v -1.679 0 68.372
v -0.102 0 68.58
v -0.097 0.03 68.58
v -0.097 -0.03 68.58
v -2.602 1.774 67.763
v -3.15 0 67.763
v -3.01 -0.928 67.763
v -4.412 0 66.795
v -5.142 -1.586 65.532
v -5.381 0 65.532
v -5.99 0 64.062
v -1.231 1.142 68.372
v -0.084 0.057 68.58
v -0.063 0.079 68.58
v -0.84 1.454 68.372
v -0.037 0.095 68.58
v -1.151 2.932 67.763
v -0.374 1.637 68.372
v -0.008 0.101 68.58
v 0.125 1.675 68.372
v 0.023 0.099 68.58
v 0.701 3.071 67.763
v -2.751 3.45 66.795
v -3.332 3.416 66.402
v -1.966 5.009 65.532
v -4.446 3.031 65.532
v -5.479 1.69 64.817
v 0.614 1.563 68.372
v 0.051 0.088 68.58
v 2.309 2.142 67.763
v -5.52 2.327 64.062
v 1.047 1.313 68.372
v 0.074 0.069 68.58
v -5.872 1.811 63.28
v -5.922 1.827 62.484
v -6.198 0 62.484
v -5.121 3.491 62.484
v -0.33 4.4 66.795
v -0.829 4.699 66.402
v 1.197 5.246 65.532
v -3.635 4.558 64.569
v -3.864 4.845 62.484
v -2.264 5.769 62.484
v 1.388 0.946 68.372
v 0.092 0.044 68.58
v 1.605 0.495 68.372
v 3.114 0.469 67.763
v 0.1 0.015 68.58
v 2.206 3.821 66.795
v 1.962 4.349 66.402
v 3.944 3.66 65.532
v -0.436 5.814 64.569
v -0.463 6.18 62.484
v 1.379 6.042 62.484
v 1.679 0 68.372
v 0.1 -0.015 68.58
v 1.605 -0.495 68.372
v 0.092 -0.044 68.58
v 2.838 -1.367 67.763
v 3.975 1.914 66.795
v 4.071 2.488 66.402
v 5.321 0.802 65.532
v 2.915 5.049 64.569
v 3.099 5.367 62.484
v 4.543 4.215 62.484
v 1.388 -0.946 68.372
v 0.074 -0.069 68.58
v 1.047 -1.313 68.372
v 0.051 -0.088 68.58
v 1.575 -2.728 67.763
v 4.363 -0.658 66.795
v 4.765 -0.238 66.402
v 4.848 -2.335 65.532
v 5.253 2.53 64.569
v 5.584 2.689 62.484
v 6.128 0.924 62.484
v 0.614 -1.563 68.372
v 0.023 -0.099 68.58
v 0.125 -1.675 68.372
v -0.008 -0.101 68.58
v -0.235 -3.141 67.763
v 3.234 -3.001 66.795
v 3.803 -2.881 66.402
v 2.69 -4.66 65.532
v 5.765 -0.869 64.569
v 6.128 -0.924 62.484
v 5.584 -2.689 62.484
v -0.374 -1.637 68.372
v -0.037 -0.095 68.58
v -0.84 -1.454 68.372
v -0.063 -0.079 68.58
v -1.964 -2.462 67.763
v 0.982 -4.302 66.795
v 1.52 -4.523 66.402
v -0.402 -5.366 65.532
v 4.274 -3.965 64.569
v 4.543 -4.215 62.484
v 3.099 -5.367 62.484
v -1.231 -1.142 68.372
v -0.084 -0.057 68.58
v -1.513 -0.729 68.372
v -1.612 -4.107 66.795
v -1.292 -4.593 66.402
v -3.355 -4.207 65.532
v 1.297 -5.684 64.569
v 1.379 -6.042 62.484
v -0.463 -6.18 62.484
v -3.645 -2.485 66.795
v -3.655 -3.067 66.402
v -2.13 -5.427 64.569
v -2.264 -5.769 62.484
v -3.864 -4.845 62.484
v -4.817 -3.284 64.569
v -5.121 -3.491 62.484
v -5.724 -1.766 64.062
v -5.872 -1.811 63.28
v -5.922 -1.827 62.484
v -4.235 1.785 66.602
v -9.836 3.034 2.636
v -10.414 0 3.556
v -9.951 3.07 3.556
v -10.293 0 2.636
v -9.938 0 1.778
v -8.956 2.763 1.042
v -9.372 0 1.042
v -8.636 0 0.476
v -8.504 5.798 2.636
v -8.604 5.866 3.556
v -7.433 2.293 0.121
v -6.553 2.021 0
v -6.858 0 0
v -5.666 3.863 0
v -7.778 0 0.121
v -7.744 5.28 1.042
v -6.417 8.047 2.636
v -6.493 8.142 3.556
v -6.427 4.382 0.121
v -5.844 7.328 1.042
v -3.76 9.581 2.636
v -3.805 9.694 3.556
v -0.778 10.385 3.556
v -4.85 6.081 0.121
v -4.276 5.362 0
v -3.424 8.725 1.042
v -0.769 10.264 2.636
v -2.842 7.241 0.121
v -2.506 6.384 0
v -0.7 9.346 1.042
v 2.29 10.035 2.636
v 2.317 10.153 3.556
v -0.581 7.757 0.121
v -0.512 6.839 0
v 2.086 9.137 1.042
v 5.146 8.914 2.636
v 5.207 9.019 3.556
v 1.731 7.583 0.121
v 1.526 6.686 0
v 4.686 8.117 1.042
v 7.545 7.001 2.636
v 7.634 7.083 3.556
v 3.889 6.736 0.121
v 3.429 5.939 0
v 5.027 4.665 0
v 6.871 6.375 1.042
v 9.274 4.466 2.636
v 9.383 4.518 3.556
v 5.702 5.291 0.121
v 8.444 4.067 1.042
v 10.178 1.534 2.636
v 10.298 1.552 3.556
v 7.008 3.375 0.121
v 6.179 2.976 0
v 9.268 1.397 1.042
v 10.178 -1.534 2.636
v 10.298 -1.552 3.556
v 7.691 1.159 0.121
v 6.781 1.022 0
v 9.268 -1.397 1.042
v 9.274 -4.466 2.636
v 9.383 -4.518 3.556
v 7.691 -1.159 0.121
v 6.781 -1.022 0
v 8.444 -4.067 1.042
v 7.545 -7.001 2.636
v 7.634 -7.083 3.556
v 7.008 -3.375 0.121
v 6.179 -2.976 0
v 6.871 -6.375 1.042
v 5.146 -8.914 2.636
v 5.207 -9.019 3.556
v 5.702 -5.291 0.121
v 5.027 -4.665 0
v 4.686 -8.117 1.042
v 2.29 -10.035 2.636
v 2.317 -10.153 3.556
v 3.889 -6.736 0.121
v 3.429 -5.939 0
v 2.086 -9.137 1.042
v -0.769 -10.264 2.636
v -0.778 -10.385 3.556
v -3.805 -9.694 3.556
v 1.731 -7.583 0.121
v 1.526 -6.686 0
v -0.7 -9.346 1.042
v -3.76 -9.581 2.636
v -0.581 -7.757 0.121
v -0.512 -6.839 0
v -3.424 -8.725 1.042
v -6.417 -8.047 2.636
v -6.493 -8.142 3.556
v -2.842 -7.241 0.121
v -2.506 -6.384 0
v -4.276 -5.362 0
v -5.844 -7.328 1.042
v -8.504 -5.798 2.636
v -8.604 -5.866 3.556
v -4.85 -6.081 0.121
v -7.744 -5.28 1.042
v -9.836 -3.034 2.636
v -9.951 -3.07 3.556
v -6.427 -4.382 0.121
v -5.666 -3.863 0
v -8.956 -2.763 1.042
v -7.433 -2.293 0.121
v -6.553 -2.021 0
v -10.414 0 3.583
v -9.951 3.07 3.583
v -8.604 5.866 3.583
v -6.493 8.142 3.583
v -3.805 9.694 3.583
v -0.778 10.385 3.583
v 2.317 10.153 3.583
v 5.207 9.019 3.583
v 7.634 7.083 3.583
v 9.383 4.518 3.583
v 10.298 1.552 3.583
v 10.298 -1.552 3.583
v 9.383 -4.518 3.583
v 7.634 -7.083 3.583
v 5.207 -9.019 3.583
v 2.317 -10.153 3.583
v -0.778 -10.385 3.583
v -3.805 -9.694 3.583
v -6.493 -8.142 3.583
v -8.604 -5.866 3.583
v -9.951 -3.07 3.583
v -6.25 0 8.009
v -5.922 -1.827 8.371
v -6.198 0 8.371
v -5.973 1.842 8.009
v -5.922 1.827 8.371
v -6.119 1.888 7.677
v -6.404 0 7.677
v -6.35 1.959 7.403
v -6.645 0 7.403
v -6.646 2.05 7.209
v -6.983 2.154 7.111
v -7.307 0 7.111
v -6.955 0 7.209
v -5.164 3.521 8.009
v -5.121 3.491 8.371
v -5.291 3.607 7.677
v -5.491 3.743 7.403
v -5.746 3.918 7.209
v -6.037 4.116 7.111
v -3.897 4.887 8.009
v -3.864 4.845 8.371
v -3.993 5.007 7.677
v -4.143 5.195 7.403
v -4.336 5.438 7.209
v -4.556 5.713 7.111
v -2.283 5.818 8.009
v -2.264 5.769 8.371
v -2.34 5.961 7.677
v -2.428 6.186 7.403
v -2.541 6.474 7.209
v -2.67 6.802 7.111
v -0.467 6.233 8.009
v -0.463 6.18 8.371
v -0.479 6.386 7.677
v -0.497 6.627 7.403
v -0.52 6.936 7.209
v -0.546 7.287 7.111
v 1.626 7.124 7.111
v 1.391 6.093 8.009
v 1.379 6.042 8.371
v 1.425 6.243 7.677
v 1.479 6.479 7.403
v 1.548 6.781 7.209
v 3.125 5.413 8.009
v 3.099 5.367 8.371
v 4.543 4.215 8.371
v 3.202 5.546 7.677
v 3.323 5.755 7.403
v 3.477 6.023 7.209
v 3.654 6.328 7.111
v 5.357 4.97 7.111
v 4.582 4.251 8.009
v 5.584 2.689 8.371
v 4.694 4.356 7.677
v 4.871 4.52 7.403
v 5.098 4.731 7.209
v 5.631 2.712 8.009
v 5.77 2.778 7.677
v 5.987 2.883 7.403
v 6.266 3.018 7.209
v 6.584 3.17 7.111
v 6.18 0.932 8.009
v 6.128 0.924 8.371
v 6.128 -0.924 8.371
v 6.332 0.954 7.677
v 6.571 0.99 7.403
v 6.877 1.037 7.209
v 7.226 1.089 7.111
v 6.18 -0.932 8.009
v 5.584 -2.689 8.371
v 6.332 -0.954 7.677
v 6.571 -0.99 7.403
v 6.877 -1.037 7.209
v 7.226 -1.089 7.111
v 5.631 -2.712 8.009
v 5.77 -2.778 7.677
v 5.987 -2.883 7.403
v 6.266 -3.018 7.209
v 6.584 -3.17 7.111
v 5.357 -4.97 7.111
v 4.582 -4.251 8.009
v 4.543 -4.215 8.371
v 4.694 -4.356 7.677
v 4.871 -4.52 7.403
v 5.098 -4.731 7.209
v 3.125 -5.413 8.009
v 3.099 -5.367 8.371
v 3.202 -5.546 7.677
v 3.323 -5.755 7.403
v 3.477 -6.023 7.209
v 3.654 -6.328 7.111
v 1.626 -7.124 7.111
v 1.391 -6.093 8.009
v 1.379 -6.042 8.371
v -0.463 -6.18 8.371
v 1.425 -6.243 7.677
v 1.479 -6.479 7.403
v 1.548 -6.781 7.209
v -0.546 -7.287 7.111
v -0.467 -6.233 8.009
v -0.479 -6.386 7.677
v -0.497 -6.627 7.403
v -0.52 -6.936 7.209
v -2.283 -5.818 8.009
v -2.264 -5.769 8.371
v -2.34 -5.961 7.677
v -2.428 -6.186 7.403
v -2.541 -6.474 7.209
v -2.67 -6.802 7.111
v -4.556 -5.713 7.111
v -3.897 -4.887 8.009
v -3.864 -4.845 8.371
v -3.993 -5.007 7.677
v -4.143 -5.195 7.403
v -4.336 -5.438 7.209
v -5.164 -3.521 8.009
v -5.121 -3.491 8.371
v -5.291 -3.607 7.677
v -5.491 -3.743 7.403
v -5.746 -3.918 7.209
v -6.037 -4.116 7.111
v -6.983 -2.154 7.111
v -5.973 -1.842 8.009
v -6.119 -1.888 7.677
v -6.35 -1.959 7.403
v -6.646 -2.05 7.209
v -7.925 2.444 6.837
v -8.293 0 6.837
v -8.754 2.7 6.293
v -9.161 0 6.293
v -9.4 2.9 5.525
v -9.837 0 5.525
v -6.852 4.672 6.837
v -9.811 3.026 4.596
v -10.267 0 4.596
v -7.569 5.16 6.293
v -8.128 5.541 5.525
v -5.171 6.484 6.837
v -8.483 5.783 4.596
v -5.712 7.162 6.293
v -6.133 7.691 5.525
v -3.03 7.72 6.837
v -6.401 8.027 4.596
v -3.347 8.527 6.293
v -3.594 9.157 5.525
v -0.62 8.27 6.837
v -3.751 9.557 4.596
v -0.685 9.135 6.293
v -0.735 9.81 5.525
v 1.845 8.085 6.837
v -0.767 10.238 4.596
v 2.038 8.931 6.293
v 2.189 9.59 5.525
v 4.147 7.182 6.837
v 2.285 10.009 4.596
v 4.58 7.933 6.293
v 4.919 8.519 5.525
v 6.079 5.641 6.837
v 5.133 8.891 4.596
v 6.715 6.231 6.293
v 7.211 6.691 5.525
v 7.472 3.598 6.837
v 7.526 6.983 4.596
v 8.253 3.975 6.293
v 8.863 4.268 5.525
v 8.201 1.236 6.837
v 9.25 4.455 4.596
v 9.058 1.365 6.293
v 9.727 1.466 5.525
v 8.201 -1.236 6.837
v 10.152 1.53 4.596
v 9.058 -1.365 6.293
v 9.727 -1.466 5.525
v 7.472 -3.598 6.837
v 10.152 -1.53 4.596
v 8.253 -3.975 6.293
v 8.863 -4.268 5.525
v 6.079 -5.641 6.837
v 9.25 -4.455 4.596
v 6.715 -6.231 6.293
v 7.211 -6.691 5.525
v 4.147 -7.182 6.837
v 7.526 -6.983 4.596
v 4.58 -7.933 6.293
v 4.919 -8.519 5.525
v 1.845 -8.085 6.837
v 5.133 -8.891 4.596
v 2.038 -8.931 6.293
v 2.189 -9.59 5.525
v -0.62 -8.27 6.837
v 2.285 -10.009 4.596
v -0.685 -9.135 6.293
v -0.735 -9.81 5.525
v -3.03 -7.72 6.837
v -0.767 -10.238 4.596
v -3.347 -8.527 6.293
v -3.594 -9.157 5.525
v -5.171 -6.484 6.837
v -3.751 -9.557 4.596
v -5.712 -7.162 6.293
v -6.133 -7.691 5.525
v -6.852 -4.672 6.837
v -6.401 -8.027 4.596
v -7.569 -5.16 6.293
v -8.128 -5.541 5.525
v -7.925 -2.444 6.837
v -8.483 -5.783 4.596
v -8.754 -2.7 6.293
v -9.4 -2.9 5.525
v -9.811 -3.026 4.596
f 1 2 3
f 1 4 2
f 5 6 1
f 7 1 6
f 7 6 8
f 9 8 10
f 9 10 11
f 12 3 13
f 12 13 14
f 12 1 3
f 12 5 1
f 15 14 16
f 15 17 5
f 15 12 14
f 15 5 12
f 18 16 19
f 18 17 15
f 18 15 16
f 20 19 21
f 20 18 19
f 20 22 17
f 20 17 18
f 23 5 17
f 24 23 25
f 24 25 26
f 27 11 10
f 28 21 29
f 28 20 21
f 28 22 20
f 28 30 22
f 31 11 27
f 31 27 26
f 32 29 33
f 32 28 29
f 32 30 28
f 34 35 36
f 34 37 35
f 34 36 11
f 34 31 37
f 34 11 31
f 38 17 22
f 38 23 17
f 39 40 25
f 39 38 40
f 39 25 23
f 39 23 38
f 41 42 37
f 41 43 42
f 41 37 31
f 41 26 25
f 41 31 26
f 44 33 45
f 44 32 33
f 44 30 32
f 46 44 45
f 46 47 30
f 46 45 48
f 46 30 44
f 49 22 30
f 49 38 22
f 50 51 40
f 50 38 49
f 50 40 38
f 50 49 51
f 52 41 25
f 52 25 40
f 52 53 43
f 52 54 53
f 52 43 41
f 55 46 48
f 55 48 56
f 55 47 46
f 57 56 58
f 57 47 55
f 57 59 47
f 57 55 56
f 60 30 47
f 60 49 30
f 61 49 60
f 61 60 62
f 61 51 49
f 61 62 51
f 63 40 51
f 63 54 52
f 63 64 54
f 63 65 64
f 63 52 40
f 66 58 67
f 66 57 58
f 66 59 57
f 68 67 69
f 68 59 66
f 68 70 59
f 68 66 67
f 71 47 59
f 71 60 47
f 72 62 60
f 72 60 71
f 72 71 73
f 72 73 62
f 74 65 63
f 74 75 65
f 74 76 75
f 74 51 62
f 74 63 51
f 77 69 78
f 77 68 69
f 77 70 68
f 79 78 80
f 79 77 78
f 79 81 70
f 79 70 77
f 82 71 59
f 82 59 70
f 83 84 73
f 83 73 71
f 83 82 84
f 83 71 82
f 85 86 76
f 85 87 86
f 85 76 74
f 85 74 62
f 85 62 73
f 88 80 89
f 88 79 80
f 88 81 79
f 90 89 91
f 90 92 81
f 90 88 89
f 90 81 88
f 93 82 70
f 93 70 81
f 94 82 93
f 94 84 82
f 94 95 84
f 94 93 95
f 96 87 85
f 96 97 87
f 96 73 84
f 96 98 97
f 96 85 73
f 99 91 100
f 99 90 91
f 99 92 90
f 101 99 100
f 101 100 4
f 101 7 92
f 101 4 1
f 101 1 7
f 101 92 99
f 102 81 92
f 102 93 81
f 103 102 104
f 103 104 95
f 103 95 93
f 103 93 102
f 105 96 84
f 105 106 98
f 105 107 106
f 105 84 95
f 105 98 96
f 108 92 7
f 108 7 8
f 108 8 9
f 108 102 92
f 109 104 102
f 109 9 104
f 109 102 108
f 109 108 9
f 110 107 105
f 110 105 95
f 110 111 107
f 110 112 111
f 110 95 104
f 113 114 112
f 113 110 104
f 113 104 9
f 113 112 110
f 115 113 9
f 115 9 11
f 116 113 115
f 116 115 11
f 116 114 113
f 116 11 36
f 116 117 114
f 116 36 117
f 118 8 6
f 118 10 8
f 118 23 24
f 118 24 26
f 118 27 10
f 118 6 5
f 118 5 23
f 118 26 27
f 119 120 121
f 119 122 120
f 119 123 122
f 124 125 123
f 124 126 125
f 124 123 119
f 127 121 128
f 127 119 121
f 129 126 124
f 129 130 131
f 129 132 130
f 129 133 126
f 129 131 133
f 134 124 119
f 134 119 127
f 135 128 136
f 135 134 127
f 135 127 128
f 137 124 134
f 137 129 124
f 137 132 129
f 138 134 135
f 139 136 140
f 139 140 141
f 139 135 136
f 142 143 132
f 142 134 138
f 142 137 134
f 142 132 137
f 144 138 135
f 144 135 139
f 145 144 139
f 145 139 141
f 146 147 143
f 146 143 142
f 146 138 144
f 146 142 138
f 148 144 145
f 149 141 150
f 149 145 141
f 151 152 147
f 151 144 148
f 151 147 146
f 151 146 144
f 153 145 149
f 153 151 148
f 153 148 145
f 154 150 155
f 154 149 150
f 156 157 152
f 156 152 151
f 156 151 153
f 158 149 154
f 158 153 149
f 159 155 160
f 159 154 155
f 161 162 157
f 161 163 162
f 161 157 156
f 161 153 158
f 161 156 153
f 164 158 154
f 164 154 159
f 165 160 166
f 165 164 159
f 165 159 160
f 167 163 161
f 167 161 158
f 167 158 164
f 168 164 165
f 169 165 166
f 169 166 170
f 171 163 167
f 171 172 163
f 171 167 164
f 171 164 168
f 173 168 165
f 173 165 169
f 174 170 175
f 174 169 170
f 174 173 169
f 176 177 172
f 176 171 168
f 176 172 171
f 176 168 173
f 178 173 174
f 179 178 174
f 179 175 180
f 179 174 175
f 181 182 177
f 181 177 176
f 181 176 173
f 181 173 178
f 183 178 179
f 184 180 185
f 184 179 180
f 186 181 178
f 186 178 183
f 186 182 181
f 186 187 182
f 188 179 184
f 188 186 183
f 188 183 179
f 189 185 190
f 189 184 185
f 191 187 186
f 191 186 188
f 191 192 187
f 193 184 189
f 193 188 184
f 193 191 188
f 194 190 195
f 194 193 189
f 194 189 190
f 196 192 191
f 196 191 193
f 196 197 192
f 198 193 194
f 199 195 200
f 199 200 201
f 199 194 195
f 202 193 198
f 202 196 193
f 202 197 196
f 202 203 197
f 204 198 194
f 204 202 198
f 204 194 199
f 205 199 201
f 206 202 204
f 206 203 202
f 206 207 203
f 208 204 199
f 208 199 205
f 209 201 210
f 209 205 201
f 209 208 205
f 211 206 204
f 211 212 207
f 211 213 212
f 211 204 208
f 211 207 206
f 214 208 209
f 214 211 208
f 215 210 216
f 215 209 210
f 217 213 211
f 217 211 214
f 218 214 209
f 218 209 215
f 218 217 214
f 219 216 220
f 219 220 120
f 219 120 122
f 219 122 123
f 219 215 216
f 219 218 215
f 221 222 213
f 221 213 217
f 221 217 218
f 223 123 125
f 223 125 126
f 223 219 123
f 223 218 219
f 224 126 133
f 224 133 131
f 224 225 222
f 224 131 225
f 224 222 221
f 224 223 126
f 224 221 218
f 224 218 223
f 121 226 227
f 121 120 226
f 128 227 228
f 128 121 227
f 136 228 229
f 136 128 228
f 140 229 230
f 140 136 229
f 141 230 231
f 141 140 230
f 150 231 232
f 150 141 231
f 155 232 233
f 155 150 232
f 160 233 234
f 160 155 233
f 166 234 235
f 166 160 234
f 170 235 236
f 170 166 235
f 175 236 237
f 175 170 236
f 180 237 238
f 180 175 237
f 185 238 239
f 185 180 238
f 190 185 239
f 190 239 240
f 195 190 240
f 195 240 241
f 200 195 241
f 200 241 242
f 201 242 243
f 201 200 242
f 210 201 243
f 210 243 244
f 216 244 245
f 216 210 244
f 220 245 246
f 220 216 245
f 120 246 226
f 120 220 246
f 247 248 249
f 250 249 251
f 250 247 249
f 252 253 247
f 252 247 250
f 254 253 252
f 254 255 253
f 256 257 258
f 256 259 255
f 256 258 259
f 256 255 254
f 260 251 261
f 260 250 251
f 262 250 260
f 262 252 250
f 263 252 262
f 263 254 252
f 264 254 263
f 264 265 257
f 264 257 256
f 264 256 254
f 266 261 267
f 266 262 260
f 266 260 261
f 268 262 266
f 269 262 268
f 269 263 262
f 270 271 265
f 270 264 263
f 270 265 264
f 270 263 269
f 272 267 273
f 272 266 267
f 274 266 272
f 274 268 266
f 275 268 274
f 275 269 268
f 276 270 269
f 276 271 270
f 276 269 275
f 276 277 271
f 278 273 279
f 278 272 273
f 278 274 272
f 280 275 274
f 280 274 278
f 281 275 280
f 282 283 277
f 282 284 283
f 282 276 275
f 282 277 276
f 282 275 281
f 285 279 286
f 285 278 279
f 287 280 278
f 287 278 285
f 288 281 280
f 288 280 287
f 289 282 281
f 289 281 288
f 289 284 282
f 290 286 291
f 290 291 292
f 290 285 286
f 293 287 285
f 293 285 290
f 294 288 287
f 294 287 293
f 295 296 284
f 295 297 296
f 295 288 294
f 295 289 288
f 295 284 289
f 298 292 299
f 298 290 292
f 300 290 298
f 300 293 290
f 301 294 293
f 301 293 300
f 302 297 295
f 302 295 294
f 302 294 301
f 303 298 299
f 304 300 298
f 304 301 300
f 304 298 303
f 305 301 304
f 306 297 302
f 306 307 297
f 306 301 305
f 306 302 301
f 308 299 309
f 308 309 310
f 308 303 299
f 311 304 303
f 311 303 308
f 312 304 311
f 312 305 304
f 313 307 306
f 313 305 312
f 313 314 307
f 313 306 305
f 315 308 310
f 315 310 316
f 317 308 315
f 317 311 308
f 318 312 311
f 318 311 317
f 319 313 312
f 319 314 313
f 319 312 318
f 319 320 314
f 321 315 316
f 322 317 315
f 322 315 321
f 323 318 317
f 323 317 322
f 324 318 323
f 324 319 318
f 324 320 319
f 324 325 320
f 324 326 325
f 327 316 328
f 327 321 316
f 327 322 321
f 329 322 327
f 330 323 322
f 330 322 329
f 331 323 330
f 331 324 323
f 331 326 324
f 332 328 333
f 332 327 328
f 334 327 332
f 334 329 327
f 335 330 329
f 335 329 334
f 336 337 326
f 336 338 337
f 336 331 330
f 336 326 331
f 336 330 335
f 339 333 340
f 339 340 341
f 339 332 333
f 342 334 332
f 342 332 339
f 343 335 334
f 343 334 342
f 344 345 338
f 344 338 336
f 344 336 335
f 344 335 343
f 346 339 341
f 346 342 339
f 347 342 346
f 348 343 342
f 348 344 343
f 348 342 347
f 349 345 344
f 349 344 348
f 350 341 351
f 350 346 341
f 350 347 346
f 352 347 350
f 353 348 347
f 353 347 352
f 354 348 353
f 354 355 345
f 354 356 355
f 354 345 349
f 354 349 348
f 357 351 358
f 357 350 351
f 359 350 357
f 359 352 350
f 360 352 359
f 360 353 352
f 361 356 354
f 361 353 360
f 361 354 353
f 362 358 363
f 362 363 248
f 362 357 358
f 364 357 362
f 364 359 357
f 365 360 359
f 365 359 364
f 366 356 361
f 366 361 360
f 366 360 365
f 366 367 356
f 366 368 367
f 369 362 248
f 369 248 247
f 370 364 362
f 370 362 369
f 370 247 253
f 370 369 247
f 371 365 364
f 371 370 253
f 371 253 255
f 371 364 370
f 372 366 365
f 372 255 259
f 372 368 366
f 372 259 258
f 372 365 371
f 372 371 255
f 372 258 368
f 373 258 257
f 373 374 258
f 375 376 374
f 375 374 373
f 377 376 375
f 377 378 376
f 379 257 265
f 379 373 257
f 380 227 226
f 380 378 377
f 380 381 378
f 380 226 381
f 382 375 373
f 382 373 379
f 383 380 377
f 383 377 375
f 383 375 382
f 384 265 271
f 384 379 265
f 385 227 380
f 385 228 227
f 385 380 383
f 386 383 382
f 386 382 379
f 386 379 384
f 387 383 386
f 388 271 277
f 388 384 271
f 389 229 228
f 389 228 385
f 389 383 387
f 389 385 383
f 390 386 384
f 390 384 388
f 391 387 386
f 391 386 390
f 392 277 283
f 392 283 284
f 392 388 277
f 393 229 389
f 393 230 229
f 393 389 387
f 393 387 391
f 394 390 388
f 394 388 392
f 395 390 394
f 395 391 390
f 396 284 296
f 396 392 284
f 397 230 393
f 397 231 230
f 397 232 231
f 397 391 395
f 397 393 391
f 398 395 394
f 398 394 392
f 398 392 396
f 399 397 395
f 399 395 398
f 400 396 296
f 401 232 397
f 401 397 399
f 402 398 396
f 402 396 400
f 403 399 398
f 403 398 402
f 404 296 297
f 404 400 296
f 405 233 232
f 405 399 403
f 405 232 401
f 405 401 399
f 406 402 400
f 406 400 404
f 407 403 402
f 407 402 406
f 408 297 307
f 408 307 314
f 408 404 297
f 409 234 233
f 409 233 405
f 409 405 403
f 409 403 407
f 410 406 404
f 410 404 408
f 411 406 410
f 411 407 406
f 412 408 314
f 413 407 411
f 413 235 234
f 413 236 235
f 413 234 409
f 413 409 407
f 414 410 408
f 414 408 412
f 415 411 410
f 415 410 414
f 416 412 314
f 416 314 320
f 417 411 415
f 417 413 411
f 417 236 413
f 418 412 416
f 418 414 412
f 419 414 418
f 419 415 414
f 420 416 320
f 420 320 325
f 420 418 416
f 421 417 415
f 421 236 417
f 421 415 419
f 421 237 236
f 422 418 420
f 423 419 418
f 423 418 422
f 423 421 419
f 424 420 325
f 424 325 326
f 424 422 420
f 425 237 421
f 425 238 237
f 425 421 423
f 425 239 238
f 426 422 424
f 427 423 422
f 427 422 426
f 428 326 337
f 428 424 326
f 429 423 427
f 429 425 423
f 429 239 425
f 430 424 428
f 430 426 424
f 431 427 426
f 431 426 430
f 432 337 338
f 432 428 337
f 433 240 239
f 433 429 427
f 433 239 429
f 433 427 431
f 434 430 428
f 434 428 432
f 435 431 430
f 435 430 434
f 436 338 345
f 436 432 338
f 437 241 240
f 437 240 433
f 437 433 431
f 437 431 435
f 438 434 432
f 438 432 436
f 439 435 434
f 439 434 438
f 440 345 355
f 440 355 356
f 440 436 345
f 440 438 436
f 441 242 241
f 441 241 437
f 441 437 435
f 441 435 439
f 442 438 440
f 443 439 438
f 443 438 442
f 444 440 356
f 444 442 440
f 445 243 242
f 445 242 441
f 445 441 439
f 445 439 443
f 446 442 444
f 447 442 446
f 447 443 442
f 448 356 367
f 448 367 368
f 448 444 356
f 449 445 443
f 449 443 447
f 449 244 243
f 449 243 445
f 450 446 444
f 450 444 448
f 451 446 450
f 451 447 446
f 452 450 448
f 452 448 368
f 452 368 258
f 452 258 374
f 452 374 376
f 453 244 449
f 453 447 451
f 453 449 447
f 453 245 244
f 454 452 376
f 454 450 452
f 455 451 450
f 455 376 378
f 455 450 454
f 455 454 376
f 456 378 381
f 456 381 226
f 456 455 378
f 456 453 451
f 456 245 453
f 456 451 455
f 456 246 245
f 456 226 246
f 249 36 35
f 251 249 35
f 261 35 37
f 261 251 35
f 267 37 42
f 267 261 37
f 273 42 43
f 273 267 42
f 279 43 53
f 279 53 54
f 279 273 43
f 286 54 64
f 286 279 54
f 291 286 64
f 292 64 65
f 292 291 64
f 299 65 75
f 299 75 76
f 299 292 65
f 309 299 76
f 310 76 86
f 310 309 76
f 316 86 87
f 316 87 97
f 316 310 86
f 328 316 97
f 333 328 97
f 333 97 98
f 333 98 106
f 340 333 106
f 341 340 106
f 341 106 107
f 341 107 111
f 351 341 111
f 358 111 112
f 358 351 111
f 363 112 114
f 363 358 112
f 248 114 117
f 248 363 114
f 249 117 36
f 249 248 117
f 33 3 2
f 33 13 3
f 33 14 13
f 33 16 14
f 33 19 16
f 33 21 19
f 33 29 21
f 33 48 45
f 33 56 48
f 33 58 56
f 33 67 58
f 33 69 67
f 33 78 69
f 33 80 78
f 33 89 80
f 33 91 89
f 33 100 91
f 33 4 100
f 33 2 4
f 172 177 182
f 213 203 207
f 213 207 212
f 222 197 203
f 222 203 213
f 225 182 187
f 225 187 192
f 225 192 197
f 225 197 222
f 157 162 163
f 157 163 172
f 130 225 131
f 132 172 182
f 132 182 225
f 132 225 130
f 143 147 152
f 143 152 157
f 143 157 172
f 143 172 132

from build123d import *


with BuildPart() as f1:
    # F0 (on Front) → F1 (revolve)
    with BuildSketch(Plane.XZ):
        with BuildLine():
            Line((-6.858, 0), (0, 0))
            Line((0, 0), (0, 68.58))
            Line((0, 68.58), (-0.1016, 68.58))
            ThreePointArc((-0.1016, 68.58), (-4.412123, 66.794523), (-6.1976, 62.484))
            Line((-6.1976, 62.484), (-6.1976, 8.370646))
            ThreePointArc((-6.1976, 8.370646), (-6.514543, 7.531252), (-7.307179, 7.110819))
            ThreePointArc((-7.307179, 7.110819), (-9.526559, 5.933606), (-10.414, 3.583302))
            Line((-10.414, 3.583302), (-10.414, 3.556))
            ThreePointArc((-10.414, 3.556), (-9.372472, 1.041528), (-6.858, 0))
        make_face()
    revolve(axis=Axis((0, 0, 34.29), (0, 0, -1)))


solid = f1.part
